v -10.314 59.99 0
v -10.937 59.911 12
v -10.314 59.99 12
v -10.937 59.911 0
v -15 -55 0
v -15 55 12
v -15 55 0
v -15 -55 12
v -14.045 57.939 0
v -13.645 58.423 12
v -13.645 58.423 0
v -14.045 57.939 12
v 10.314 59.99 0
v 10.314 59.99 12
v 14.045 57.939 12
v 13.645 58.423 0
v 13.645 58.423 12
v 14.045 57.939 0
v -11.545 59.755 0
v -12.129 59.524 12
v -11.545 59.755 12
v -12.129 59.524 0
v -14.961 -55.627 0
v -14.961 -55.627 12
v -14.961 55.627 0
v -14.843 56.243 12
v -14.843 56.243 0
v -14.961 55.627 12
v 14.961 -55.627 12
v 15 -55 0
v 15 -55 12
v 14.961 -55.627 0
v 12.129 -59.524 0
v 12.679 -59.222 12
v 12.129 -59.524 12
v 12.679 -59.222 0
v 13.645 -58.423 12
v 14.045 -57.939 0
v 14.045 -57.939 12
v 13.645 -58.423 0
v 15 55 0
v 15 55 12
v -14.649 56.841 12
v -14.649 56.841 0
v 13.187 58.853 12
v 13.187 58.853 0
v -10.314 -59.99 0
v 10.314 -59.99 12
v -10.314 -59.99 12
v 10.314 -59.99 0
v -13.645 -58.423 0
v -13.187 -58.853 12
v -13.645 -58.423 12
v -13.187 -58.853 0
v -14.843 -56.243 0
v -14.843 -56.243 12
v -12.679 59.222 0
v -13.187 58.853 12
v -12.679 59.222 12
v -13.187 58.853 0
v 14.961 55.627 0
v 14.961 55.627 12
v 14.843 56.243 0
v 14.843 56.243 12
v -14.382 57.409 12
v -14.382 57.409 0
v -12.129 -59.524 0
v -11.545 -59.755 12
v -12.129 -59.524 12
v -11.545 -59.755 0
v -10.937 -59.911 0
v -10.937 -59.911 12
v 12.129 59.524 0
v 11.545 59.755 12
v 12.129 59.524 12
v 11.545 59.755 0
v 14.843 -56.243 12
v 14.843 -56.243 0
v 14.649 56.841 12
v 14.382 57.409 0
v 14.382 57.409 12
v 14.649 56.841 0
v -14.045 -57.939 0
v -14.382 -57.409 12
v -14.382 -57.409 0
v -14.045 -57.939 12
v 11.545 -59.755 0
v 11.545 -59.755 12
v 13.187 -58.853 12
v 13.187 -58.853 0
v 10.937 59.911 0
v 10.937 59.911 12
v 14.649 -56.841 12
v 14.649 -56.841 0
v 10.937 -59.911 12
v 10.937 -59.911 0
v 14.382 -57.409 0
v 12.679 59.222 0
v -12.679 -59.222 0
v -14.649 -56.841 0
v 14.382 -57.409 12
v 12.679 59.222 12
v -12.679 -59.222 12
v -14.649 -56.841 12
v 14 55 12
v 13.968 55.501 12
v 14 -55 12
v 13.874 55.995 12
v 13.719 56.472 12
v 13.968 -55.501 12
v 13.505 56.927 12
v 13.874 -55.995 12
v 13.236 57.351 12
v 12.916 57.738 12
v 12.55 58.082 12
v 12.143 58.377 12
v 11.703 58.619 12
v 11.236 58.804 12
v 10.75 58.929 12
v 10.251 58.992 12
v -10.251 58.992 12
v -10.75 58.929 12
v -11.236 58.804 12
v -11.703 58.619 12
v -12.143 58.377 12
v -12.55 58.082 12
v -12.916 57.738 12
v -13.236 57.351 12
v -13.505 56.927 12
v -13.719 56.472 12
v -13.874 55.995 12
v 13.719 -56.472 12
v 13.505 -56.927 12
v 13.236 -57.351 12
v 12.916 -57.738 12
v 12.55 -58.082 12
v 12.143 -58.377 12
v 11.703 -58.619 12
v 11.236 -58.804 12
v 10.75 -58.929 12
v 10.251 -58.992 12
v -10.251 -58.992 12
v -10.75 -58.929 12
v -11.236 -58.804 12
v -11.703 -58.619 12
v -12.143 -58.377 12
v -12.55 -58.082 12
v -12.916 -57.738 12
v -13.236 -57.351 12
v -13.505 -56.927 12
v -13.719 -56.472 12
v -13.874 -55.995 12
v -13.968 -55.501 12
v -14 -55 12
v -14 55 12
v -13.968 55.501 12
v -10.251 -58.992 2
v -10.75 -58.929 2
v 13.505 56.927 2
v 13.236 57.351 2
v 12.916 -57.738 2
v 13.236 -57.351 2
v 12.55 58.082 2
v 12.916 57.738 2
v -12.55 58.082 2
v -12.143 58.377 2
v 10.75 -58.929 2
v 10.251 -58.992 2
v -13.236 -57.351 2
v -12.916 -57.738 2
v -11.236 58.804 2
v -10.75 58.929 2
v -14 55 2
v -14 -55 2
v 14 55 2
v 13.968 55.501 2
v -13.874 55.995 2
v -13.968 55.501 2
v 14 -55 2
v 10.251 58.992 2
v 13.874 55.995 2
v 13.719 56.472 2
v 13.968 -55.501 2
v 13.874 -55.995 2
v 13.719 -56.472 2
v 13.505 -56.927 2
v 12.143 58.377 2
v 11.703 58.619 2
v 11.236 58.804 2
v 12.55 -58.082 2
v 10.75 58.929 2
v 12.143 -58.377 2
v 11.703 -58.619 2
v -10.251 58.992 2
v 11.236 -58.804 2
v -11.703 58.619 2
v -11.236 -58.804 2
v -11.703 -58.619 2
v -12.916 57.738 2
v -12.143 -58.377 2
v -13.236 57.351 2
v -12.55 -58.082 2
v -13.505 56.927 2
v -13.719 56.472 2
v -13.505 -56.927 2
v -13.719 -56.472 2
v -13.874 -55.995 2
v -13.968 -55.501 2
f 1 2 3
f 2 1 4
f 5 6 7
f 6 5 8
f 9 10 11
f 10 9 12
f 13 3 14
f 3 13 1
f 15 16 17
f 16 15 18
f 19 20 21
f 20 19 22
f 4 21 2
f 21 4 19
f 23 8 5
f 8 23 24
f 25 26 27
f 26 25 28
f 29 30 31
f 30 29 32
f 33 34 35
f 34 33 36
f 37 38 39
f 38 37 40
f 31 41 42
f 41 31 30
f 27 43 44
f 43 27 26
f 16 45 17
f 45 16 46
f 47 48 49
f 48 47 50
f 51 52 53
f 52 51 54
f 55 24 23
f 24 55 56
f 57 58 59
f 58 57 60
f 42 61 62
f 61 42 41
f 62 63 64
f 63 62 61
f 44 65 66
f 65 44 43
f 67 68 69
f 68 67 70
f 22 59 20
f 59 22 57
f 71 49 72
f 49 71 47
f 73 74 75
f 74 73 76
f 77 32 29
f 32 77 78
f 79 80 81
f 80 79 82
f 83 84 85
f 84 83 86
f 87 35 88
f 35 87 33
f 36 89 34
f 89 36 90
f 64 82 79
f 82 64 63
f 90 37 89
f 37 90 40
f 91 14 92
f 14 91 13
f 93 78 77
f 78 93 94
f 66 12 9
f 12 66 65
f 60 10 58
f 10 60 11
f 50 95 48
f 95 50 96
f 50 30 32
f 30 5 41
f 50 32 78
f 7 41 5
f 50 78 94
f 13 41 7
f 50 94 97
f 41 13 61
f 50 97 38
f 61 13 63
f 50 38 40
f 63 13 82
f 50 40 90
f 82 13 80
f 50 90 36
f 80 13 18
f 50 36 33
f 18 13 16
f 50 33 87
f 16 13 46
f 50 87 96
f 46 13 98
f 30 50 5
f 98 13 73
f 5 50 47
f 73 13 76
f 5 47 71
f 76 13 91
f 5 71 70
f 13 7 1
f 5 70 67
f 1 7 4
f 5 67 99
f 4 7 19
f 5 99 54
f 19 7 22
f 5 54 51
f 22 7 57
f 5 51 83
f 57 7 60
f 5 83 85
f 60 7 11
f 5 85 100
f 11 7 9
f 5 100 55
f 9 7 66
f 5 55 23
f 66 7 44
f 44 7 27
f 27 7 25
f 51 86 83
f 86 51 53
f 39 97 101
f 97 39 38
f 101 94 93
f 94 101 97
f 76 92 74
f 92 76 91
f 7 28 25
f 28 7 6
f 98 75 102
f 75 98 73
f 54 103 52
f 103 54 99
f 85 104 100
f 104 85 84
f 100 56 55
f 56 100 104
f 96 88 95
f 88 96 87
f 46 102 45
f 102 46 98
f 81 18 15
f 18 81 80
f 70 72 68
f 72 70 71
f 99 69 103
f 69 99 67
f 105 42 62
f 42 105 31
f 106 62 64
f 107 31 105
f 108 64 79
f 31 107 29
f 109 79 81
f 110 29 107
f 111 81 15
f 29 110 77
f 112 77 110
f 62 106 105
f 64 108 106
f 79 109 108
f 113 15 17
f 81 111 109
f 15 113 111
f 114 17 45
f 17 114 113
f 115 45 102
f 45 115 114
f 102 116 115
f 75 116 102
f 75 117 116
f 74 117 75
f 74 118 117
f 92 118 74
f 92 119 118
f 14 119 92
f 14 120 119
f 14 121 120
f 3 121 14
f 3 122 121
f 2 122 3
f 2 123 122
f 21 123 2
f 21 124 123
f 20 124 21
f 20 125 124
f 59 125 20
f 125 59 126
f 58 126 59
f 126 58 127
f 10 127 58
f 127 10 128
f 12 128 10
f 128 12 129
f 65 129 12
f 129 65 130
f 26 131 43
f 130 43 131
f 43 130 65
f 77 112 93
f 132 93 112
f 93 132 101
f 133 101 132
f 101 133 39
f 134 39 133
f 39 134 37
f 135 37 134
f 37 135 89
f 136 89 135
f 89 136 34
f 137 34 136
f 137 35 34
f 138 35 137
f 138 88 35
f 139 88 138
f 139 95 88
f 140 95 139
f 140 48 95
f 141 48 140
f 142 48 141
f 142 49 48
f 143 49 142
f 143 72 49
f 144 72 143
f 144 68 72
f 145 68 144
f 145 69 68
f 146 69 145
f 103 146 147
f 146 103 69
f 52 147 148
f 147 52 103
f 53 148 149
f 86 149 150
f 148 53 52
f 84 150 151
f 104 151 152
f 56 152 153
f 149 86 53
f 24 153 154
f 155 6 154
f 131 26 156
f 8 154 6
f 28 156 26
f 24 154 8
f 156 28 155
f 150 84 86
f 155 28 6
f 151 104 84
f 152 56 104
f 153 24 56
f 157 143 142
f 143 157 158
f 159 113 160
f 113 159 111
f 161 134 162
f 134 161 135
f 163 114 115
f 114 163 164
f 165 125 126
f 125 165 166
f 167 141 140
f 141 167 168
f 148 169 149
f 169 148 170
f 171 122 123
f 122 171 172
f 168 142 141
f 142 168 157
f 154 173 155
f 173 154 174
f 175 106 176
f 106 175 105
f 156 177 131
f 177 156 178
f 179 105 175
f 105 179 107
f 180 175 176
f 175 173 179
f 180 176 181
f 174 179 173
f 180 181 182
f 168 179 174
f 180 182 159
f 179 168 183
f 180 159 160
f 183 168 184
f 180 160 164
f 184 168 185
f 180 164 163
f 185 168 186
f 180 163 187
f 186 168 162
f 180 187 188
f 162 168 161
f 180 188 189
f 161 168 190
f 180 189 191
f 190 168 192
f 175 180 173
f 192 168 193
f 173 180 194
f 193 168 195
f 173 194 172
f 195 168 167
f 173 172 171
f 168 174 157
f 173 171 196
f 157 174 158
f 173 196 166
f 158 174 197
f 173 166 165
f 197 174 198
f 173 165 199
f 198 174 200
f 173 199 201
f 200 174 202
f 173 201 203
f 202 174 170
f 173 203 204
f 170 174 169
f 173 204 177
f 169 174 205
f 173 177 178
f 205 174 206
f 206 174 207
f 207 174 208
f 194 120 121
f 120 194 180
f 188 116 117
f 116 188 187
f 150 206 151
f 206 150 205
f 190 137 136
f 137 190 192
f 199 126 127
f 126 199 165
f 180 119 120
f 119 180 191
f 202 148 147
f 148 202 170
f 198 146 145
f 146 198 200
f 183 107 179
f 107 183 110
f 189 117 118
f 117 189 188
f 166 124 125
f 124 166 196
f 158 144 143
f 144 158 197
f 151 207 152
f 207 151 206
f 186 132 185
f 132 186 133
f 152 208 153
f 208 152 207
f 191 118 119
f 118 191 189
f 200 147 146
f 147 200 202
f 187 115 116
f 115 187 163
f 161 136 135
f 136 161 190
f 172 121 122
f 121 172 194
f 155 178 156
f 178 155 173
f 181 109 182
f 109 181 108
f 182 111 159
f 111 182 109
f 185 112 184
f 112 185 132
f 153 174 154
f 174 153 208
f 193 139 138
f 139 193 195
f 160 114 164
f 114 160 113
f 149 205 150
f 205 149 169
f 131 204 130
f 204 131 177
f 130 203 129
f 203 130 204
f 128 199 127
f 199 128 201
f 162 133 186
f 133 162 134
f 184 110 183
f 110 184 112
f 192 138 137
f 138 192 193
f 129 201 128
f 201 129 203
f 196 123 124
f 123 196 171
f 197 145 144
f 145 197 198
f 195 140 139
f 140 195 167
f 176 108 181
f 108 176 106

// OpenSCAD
$fn = 50;


difference() {
	union() {
		hull() {
			translate(v = [-10.0000000000, 55.0000000000, 0]) {
				cylinder(h = 12, r = 5);
			}
			translate(v = [10.0000000000, 55.0000000000, 0]) {
				cylinder(h = 12, r = 5);
			}
			translate(v = [-10.0000000000, -55.0000000000, 0]) {
				cylinder(h = 12, r = 5);
			}
			translate(v = [10.0000000000, -55.0000000000, 0]) {
				cylinder(h = 12, r = 5);
			}
		}
	}
	union() {
		translate(v = [0, 0, 2]) {
			hull() {
				translate(v = [-10.0000000000, 55.0000000000, 0]) {
					cylinder(h = 10, r = 4);
				}
				translate(v = [10.0000000000, 55.0000000000, 0]) {
					cylinder(h = 10, r = 4);
				}
				translate(v = [-10.0000000000, -55.0000000000, 0]) {
					cylinder(h = 10, r = 4);
				}
				translate(v = [10.0000000000, -55.0000000000, 0]) {
					cylinder(h = 10, r = 4);
				}
			}
		}
	}
}
